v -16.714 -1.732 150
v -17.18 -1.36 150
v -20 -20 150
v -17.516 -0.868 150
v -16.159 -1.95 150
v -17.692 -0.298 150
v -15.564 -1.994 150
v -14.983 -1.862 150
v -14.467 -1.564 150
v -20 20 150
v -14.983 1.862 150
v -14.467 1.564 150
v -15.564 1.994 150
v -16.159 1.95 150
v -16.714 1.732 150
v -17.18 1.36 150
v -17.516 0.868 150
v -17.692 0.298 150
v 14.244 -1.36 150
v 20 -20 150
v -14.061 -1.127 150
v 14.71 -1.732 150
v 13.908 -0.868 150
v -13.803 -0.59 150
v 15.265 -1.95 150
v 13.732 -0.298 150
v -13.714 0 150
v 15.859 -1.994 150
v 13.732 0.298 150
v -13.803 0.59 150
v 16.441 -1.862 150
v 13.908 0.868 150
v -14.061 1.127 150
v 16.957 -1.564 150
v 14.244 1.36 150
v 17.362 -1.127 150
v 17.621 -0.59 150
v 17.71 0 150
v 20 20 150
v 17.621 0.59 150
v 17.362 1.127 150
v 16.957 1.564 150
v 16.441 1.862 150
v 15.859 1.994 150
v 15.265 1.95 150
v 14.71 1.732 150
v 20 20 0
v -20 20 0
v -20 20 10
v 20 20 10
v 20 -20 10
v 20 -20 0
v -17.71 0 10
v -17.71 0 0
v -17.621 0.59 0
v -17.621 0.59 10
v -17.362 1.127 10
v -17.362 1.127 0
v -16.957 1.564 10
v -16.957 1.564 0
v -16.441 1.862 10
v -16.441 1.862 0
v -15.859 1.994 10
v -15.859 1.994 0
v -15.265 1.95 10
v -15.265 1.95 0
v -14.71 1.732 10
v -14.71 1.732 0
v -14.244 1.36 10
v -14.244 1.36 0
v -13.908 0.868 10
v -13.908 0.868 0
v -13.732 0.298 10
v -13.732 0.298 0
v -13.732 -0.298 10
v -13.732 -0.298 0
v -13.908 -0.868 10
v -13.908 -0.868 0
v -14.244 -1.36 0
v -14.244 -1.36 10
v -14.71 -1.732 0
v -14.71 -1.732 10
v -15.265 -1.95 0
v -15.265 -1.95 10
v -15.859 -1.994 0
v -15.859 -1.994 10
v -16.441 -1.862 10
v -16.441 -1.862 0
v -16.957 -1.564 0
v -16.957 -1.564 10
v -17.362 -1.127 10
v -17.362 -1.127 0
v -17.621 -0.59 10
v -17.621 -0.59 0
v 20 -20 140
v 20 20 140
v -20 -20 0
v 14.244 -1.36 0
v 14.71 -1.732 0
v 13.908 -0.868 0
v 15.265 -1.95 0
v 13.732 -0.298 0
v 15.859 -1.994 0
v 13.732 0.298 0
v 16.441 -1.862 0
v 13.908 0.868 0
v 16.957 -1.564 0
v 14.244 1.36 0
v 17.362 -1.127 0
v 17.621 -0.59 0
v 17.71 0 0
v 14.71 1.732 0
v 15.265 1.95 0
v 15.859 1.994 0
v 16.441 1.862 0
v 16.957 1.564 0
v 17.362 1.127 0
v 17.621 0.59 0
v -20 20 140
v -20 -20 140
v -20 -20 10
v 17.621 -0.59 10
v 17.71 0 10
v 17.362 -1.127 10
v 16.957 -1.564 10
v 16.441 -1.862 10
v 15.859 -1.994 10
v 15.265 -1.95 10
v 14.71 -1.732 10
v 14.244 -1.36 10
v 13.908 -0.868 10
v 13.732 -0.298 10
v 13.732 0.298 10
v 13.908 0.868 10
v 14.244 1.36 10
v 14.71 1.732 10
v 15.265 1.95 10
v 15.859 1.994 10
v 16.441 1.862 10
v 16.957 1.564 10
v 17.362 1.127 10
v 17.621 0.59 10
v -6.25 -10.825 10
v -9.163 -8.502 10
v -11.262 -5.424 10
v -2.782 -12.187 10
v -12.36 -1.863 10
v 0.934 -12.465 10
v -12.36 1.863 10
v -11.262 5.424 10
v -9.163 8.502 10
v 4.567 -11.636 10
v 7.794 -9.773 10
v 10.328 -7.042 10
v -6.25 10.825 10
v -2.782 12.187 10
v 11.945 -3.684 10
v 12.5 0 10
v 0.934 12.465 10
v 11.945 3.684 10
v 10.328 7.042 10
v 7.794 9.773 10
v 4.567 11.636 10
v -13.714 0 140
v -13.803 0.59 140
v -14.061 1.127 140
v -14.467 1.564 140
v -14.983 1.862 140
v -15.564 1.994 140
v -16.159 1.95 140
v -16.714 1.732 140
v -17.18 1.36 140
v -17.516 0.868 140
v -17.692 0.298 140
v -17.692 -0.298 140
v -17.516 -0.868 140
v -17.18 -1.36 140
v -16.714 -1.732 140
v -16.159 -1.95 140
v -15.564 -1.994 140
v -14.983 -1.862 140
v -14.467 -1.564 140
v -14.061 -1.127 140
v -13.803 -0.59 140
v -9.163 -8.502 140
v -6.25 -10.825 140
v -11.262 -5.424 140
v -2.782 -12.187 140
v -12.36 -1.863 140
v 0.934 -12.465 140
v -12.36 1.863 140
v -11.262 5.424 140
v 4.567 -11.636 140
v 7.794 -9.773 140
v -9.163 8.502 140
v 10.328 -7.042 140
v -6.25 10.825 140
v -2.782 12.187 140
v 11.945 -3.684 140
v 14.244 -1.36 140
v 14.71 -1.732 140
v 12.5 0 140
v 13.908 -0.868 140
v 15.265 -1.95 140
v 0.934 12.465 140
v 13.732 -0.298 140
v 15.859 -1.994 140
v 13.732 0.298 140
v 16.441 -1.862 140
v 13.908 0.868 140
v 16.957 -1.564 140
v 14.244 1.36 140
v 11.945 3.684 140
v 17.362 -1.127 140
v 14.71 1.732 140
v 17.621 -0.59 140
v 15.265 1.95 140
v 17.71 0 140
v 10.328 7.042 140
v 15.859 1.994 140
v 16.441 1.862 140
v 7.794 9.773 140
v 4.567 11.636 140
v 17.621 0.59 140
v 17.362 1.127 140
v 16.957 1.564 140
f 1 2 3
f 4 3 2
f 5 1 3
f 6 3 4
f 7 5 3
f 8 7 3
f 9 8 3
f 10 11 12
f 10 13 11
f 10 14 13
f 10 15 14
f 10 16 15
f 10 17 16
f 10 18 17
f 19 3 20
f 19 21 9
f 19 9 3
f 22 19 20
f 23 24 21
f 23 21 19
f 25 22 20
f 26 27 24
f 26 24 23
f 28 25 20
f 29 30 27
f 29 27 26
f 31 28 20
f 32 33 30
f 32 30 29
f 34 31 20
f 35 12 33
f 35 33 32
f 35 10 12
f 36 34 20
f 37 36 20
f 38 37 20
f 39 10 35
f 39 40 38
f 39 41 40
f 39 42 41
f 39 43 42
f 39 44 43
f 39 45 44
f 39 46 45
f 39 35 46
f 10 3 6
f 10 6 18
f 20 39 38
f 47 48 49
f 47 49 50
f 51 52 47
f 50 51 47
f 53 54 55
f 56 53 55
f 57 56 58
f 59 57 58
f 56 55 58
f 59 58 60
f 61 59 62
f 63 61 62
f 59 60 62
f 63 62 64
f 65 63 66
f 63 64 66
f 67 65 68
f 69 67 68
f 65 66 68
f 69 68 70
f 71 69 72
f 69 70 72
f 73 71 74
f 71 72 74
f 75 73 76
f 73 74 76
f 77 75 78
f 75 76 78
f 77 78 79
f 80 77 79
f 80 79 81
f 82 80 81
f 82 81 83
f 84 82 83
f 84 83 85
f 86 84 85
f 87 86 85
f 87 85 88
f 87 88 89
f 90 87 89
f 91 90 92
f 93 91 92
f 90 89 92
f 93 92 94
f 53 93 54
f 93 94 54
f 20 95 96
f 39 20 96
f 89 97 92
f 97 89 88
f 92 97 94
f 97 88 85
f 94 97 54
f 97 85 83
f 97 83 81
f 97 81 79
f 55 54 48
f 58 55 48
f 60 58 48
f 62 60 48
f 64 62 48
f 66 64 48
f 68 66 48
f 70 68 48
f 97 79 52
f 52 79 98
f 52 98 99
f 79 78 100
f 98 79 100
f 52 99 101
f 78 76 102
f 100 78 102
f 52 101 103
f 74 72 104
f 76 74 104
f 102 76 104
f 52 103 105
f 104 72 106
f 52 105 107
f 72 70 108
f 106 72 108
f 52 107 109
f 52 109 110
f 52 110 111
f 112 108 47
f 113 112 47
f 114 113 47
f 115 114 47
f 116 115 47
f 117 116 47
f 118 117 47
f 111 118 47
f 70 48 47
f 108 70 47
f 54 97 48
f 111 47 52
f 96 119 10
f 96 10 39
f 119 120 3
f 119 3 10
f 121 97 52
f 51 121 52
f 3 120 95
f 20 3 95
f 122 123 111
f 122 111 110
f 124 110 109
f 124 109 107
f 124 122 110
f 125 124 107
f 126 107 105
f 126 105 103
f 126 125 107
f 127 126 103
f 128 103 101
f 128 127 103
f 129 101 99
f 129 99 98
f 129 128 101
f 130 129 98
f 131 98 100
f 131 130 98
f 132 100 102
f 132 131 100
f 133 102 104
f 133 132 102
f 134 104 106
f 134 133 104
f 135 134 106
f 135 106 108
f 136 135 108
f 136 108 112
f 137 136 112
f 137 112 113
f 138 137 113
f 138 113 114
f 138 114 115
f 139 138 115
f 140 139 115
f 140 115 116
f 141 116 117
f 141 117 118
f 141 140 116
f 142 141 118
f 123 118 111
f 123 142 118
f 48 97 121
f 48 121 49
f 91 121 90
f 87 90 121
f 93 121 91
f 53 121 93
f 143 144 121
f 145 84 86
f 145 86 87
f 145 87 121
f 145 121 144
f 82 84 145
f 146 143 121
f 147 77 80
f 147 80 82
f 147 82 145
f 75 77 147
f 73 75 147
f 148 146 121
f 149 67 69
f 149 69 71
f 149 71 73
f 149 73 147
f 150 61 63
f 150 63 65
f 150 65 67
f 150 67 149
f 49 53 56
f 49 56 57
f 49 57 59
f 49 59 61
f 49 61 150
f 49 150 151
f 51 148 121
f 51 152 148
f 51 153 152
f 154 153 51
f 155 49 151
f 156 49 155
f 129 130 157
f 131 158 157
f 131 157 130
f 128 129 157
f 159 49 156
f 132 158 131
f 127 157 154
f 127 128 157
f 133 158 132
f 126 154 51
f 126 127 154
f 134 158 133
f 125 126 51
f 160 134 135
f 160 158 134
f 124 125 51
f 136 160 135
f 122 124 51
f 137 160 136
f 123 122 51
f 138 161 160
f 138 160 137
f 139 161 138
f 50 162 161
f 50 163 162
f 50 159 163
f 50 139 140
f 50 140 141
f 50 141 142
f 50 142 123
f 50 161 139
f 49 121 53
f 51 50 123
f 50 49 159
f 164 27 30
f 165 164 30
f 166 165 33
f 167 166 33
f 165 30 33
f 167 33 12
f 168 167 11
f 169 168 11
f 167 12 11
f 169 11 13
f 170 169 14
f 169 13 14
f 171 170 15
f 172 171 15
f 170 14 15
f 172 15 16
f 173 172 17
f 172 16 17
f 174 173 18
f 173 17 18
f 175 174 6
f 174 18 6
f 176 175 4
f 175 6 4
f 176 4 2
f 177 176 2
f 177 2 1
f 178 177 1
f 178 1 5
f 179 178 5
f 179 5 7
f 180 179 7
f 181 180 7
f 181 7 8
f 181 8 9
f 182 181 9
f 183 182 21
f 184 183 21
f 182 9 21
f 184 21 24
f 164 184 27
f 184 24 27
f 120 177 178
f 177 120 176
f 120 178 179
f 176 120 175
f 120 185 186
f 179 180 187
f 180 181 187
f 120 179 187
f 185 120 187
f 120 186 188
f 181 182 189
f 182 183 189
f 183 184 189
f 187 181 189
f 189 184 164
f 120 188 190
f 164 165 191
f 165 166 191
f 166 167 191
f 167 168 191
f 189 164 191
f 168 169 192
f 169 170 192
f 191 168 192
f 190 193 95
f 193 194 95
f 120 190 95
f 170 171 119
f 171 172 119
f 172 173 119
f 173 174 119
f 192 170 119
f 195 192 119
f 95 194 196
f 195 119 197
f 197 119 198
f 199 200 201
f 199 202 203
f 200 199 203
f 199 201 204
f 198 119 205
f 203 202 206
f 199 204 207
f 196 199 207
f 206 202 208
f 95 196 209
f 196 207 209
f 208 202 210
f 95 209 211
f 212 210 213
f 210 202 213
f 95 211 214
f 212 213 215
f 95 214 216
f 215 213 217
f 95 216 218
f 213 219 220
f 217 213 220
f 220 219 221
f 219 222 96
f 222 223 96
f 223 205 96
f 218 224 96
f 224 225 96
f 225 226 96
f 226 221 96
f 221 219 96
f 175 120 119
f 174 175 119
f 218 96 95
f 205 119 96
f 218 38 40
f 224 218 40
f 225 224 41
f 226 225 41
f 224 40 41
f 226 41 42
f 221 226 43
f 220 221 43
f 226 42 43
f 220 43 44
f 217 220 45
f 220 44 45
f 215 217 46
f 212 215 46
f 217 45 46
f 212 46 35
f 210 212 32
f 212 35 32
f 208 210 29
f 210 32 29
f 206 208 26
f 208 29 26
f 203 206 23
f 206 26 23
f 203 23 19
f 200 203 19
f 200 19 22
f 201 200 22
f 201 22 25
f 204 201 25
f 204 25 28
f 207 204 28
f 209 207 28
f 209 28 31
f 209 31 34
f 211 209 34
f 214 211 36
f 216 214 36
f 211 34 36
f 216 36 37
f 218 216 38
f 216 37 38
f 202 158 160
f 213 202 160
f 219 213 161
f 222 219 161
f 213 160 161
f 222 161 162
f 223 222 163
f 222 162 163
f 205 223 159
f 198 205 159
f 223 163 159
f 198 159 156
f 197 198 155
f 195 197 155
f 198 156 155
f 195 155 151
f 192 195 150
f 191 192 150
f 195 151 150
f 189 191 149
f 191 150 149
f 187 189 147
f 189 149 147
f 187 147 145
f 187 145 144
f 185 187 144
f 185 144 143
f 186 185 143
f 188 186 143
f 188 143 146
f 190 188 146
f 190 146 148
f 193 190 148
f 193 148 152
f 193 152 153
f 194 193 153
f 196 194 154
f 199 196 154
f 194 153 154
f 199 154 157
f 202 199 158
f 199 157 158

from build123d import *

# Parameters (mm, degrees)
SKETCH_1_W          = 40
SKETCH_1_H          = 40
EXTRUDE_1_DEPTH     = 10
SKETCH_2_R          = 12.5
EXTRUDE_2_DEPTH     = 130
SKETCH_3_W          = 40
SKETCH_3_H          = 40
EXTRUDE_3_DEPTH     = 10
SKETCH_4_R          = 2
CUT_EXTRUDE_1_DEPTH = 10
SKETCH_5_R          = 2
CUT_EXTRUDE_2_DEPTH = 10
CUT_EXTRUDE_START   = -10
SKETCH_6_R          = 2
CUT_EXTRUDE_3_DEPTH = 10
SKETCH_7_R          = 2
CUT_EXTRUDE_4_DEPTH = 10


with BuildPart() as part:
    # 草圖1 → 填料-伸長1 (new body)
    with BuildSketch(Plane.XY):
        Rectangle(SKETCH_1_W, SKETCH_1_H)
    extrude(amount=EXTRUDE_1_DEPTH)

    # 草圖2 → 填料-伸長2 (add)
    with BuildSketch(Plane.XY.offset(10)):
        Circle(SKETCH_2_R)
    extrude(amount=EXTRUDE_2_DEPTH)

    # 草圖3 → 填料-伸長3 (add)
    with BuildSketch(Plane.XY.offset(140)):
        Rectangle(SKETCH_3_W, SKETCH_3_H)
    extrude(amount=EXTRUDE_3_DEPTH)

    # 草圖4 → 除料-伸長1 (cut)
    with BuildSketch(Plane.XY.offset(150)):
        with Locations((-15.713957528, 0)):
            Circle(SKETCH_4_R)
    extrude(amount=-CUT_EXTRUDE_1_DEPTH, mode=Mode.SUBTRACT)

    # 草圖5 → 除料-伸長2 (cut)
    with BuildSketch(Plane.XY.offset(150)):
        with Locations((15.71, 0)):
            Circle(SKETCH_5_R)
    extrude(amount=-CUT_EXTRUDE_2_DEPTH, mode=Mode.SUBTRACT)

    # 草圖6 → 除料-伸長3 (cut)
    with BuildSketch(Plane(origin=(0, 0, 0), x_dir=(-1, 0, 0), z_dir=(0, 0, -1)).offset(CUT_EXTRUDE_START)):
        with Locations(Location((-15.71, 0, 0), (0, 0, 180))):
            Circle(SKETCH_6_R)
    extrude(amount=CUT_EXTRUDE_3_DEPTH, mode=Mode.SUBTRACT)

    # 草圖7 → 除料-伸長4 (cut)
    with BuildSketch(Plane(origin=(0, 0, 0), x_dir=(-1, 0, 0), z_dir=(0, 0, -1))):
        with Locations((15.71, 0)):
            Circle(SKETCH_7_R)
    extrude(amount=-CUT_EXTRUDE_4_DEPTH, mode=Mode.SUBTRACT)


solid = part.part
